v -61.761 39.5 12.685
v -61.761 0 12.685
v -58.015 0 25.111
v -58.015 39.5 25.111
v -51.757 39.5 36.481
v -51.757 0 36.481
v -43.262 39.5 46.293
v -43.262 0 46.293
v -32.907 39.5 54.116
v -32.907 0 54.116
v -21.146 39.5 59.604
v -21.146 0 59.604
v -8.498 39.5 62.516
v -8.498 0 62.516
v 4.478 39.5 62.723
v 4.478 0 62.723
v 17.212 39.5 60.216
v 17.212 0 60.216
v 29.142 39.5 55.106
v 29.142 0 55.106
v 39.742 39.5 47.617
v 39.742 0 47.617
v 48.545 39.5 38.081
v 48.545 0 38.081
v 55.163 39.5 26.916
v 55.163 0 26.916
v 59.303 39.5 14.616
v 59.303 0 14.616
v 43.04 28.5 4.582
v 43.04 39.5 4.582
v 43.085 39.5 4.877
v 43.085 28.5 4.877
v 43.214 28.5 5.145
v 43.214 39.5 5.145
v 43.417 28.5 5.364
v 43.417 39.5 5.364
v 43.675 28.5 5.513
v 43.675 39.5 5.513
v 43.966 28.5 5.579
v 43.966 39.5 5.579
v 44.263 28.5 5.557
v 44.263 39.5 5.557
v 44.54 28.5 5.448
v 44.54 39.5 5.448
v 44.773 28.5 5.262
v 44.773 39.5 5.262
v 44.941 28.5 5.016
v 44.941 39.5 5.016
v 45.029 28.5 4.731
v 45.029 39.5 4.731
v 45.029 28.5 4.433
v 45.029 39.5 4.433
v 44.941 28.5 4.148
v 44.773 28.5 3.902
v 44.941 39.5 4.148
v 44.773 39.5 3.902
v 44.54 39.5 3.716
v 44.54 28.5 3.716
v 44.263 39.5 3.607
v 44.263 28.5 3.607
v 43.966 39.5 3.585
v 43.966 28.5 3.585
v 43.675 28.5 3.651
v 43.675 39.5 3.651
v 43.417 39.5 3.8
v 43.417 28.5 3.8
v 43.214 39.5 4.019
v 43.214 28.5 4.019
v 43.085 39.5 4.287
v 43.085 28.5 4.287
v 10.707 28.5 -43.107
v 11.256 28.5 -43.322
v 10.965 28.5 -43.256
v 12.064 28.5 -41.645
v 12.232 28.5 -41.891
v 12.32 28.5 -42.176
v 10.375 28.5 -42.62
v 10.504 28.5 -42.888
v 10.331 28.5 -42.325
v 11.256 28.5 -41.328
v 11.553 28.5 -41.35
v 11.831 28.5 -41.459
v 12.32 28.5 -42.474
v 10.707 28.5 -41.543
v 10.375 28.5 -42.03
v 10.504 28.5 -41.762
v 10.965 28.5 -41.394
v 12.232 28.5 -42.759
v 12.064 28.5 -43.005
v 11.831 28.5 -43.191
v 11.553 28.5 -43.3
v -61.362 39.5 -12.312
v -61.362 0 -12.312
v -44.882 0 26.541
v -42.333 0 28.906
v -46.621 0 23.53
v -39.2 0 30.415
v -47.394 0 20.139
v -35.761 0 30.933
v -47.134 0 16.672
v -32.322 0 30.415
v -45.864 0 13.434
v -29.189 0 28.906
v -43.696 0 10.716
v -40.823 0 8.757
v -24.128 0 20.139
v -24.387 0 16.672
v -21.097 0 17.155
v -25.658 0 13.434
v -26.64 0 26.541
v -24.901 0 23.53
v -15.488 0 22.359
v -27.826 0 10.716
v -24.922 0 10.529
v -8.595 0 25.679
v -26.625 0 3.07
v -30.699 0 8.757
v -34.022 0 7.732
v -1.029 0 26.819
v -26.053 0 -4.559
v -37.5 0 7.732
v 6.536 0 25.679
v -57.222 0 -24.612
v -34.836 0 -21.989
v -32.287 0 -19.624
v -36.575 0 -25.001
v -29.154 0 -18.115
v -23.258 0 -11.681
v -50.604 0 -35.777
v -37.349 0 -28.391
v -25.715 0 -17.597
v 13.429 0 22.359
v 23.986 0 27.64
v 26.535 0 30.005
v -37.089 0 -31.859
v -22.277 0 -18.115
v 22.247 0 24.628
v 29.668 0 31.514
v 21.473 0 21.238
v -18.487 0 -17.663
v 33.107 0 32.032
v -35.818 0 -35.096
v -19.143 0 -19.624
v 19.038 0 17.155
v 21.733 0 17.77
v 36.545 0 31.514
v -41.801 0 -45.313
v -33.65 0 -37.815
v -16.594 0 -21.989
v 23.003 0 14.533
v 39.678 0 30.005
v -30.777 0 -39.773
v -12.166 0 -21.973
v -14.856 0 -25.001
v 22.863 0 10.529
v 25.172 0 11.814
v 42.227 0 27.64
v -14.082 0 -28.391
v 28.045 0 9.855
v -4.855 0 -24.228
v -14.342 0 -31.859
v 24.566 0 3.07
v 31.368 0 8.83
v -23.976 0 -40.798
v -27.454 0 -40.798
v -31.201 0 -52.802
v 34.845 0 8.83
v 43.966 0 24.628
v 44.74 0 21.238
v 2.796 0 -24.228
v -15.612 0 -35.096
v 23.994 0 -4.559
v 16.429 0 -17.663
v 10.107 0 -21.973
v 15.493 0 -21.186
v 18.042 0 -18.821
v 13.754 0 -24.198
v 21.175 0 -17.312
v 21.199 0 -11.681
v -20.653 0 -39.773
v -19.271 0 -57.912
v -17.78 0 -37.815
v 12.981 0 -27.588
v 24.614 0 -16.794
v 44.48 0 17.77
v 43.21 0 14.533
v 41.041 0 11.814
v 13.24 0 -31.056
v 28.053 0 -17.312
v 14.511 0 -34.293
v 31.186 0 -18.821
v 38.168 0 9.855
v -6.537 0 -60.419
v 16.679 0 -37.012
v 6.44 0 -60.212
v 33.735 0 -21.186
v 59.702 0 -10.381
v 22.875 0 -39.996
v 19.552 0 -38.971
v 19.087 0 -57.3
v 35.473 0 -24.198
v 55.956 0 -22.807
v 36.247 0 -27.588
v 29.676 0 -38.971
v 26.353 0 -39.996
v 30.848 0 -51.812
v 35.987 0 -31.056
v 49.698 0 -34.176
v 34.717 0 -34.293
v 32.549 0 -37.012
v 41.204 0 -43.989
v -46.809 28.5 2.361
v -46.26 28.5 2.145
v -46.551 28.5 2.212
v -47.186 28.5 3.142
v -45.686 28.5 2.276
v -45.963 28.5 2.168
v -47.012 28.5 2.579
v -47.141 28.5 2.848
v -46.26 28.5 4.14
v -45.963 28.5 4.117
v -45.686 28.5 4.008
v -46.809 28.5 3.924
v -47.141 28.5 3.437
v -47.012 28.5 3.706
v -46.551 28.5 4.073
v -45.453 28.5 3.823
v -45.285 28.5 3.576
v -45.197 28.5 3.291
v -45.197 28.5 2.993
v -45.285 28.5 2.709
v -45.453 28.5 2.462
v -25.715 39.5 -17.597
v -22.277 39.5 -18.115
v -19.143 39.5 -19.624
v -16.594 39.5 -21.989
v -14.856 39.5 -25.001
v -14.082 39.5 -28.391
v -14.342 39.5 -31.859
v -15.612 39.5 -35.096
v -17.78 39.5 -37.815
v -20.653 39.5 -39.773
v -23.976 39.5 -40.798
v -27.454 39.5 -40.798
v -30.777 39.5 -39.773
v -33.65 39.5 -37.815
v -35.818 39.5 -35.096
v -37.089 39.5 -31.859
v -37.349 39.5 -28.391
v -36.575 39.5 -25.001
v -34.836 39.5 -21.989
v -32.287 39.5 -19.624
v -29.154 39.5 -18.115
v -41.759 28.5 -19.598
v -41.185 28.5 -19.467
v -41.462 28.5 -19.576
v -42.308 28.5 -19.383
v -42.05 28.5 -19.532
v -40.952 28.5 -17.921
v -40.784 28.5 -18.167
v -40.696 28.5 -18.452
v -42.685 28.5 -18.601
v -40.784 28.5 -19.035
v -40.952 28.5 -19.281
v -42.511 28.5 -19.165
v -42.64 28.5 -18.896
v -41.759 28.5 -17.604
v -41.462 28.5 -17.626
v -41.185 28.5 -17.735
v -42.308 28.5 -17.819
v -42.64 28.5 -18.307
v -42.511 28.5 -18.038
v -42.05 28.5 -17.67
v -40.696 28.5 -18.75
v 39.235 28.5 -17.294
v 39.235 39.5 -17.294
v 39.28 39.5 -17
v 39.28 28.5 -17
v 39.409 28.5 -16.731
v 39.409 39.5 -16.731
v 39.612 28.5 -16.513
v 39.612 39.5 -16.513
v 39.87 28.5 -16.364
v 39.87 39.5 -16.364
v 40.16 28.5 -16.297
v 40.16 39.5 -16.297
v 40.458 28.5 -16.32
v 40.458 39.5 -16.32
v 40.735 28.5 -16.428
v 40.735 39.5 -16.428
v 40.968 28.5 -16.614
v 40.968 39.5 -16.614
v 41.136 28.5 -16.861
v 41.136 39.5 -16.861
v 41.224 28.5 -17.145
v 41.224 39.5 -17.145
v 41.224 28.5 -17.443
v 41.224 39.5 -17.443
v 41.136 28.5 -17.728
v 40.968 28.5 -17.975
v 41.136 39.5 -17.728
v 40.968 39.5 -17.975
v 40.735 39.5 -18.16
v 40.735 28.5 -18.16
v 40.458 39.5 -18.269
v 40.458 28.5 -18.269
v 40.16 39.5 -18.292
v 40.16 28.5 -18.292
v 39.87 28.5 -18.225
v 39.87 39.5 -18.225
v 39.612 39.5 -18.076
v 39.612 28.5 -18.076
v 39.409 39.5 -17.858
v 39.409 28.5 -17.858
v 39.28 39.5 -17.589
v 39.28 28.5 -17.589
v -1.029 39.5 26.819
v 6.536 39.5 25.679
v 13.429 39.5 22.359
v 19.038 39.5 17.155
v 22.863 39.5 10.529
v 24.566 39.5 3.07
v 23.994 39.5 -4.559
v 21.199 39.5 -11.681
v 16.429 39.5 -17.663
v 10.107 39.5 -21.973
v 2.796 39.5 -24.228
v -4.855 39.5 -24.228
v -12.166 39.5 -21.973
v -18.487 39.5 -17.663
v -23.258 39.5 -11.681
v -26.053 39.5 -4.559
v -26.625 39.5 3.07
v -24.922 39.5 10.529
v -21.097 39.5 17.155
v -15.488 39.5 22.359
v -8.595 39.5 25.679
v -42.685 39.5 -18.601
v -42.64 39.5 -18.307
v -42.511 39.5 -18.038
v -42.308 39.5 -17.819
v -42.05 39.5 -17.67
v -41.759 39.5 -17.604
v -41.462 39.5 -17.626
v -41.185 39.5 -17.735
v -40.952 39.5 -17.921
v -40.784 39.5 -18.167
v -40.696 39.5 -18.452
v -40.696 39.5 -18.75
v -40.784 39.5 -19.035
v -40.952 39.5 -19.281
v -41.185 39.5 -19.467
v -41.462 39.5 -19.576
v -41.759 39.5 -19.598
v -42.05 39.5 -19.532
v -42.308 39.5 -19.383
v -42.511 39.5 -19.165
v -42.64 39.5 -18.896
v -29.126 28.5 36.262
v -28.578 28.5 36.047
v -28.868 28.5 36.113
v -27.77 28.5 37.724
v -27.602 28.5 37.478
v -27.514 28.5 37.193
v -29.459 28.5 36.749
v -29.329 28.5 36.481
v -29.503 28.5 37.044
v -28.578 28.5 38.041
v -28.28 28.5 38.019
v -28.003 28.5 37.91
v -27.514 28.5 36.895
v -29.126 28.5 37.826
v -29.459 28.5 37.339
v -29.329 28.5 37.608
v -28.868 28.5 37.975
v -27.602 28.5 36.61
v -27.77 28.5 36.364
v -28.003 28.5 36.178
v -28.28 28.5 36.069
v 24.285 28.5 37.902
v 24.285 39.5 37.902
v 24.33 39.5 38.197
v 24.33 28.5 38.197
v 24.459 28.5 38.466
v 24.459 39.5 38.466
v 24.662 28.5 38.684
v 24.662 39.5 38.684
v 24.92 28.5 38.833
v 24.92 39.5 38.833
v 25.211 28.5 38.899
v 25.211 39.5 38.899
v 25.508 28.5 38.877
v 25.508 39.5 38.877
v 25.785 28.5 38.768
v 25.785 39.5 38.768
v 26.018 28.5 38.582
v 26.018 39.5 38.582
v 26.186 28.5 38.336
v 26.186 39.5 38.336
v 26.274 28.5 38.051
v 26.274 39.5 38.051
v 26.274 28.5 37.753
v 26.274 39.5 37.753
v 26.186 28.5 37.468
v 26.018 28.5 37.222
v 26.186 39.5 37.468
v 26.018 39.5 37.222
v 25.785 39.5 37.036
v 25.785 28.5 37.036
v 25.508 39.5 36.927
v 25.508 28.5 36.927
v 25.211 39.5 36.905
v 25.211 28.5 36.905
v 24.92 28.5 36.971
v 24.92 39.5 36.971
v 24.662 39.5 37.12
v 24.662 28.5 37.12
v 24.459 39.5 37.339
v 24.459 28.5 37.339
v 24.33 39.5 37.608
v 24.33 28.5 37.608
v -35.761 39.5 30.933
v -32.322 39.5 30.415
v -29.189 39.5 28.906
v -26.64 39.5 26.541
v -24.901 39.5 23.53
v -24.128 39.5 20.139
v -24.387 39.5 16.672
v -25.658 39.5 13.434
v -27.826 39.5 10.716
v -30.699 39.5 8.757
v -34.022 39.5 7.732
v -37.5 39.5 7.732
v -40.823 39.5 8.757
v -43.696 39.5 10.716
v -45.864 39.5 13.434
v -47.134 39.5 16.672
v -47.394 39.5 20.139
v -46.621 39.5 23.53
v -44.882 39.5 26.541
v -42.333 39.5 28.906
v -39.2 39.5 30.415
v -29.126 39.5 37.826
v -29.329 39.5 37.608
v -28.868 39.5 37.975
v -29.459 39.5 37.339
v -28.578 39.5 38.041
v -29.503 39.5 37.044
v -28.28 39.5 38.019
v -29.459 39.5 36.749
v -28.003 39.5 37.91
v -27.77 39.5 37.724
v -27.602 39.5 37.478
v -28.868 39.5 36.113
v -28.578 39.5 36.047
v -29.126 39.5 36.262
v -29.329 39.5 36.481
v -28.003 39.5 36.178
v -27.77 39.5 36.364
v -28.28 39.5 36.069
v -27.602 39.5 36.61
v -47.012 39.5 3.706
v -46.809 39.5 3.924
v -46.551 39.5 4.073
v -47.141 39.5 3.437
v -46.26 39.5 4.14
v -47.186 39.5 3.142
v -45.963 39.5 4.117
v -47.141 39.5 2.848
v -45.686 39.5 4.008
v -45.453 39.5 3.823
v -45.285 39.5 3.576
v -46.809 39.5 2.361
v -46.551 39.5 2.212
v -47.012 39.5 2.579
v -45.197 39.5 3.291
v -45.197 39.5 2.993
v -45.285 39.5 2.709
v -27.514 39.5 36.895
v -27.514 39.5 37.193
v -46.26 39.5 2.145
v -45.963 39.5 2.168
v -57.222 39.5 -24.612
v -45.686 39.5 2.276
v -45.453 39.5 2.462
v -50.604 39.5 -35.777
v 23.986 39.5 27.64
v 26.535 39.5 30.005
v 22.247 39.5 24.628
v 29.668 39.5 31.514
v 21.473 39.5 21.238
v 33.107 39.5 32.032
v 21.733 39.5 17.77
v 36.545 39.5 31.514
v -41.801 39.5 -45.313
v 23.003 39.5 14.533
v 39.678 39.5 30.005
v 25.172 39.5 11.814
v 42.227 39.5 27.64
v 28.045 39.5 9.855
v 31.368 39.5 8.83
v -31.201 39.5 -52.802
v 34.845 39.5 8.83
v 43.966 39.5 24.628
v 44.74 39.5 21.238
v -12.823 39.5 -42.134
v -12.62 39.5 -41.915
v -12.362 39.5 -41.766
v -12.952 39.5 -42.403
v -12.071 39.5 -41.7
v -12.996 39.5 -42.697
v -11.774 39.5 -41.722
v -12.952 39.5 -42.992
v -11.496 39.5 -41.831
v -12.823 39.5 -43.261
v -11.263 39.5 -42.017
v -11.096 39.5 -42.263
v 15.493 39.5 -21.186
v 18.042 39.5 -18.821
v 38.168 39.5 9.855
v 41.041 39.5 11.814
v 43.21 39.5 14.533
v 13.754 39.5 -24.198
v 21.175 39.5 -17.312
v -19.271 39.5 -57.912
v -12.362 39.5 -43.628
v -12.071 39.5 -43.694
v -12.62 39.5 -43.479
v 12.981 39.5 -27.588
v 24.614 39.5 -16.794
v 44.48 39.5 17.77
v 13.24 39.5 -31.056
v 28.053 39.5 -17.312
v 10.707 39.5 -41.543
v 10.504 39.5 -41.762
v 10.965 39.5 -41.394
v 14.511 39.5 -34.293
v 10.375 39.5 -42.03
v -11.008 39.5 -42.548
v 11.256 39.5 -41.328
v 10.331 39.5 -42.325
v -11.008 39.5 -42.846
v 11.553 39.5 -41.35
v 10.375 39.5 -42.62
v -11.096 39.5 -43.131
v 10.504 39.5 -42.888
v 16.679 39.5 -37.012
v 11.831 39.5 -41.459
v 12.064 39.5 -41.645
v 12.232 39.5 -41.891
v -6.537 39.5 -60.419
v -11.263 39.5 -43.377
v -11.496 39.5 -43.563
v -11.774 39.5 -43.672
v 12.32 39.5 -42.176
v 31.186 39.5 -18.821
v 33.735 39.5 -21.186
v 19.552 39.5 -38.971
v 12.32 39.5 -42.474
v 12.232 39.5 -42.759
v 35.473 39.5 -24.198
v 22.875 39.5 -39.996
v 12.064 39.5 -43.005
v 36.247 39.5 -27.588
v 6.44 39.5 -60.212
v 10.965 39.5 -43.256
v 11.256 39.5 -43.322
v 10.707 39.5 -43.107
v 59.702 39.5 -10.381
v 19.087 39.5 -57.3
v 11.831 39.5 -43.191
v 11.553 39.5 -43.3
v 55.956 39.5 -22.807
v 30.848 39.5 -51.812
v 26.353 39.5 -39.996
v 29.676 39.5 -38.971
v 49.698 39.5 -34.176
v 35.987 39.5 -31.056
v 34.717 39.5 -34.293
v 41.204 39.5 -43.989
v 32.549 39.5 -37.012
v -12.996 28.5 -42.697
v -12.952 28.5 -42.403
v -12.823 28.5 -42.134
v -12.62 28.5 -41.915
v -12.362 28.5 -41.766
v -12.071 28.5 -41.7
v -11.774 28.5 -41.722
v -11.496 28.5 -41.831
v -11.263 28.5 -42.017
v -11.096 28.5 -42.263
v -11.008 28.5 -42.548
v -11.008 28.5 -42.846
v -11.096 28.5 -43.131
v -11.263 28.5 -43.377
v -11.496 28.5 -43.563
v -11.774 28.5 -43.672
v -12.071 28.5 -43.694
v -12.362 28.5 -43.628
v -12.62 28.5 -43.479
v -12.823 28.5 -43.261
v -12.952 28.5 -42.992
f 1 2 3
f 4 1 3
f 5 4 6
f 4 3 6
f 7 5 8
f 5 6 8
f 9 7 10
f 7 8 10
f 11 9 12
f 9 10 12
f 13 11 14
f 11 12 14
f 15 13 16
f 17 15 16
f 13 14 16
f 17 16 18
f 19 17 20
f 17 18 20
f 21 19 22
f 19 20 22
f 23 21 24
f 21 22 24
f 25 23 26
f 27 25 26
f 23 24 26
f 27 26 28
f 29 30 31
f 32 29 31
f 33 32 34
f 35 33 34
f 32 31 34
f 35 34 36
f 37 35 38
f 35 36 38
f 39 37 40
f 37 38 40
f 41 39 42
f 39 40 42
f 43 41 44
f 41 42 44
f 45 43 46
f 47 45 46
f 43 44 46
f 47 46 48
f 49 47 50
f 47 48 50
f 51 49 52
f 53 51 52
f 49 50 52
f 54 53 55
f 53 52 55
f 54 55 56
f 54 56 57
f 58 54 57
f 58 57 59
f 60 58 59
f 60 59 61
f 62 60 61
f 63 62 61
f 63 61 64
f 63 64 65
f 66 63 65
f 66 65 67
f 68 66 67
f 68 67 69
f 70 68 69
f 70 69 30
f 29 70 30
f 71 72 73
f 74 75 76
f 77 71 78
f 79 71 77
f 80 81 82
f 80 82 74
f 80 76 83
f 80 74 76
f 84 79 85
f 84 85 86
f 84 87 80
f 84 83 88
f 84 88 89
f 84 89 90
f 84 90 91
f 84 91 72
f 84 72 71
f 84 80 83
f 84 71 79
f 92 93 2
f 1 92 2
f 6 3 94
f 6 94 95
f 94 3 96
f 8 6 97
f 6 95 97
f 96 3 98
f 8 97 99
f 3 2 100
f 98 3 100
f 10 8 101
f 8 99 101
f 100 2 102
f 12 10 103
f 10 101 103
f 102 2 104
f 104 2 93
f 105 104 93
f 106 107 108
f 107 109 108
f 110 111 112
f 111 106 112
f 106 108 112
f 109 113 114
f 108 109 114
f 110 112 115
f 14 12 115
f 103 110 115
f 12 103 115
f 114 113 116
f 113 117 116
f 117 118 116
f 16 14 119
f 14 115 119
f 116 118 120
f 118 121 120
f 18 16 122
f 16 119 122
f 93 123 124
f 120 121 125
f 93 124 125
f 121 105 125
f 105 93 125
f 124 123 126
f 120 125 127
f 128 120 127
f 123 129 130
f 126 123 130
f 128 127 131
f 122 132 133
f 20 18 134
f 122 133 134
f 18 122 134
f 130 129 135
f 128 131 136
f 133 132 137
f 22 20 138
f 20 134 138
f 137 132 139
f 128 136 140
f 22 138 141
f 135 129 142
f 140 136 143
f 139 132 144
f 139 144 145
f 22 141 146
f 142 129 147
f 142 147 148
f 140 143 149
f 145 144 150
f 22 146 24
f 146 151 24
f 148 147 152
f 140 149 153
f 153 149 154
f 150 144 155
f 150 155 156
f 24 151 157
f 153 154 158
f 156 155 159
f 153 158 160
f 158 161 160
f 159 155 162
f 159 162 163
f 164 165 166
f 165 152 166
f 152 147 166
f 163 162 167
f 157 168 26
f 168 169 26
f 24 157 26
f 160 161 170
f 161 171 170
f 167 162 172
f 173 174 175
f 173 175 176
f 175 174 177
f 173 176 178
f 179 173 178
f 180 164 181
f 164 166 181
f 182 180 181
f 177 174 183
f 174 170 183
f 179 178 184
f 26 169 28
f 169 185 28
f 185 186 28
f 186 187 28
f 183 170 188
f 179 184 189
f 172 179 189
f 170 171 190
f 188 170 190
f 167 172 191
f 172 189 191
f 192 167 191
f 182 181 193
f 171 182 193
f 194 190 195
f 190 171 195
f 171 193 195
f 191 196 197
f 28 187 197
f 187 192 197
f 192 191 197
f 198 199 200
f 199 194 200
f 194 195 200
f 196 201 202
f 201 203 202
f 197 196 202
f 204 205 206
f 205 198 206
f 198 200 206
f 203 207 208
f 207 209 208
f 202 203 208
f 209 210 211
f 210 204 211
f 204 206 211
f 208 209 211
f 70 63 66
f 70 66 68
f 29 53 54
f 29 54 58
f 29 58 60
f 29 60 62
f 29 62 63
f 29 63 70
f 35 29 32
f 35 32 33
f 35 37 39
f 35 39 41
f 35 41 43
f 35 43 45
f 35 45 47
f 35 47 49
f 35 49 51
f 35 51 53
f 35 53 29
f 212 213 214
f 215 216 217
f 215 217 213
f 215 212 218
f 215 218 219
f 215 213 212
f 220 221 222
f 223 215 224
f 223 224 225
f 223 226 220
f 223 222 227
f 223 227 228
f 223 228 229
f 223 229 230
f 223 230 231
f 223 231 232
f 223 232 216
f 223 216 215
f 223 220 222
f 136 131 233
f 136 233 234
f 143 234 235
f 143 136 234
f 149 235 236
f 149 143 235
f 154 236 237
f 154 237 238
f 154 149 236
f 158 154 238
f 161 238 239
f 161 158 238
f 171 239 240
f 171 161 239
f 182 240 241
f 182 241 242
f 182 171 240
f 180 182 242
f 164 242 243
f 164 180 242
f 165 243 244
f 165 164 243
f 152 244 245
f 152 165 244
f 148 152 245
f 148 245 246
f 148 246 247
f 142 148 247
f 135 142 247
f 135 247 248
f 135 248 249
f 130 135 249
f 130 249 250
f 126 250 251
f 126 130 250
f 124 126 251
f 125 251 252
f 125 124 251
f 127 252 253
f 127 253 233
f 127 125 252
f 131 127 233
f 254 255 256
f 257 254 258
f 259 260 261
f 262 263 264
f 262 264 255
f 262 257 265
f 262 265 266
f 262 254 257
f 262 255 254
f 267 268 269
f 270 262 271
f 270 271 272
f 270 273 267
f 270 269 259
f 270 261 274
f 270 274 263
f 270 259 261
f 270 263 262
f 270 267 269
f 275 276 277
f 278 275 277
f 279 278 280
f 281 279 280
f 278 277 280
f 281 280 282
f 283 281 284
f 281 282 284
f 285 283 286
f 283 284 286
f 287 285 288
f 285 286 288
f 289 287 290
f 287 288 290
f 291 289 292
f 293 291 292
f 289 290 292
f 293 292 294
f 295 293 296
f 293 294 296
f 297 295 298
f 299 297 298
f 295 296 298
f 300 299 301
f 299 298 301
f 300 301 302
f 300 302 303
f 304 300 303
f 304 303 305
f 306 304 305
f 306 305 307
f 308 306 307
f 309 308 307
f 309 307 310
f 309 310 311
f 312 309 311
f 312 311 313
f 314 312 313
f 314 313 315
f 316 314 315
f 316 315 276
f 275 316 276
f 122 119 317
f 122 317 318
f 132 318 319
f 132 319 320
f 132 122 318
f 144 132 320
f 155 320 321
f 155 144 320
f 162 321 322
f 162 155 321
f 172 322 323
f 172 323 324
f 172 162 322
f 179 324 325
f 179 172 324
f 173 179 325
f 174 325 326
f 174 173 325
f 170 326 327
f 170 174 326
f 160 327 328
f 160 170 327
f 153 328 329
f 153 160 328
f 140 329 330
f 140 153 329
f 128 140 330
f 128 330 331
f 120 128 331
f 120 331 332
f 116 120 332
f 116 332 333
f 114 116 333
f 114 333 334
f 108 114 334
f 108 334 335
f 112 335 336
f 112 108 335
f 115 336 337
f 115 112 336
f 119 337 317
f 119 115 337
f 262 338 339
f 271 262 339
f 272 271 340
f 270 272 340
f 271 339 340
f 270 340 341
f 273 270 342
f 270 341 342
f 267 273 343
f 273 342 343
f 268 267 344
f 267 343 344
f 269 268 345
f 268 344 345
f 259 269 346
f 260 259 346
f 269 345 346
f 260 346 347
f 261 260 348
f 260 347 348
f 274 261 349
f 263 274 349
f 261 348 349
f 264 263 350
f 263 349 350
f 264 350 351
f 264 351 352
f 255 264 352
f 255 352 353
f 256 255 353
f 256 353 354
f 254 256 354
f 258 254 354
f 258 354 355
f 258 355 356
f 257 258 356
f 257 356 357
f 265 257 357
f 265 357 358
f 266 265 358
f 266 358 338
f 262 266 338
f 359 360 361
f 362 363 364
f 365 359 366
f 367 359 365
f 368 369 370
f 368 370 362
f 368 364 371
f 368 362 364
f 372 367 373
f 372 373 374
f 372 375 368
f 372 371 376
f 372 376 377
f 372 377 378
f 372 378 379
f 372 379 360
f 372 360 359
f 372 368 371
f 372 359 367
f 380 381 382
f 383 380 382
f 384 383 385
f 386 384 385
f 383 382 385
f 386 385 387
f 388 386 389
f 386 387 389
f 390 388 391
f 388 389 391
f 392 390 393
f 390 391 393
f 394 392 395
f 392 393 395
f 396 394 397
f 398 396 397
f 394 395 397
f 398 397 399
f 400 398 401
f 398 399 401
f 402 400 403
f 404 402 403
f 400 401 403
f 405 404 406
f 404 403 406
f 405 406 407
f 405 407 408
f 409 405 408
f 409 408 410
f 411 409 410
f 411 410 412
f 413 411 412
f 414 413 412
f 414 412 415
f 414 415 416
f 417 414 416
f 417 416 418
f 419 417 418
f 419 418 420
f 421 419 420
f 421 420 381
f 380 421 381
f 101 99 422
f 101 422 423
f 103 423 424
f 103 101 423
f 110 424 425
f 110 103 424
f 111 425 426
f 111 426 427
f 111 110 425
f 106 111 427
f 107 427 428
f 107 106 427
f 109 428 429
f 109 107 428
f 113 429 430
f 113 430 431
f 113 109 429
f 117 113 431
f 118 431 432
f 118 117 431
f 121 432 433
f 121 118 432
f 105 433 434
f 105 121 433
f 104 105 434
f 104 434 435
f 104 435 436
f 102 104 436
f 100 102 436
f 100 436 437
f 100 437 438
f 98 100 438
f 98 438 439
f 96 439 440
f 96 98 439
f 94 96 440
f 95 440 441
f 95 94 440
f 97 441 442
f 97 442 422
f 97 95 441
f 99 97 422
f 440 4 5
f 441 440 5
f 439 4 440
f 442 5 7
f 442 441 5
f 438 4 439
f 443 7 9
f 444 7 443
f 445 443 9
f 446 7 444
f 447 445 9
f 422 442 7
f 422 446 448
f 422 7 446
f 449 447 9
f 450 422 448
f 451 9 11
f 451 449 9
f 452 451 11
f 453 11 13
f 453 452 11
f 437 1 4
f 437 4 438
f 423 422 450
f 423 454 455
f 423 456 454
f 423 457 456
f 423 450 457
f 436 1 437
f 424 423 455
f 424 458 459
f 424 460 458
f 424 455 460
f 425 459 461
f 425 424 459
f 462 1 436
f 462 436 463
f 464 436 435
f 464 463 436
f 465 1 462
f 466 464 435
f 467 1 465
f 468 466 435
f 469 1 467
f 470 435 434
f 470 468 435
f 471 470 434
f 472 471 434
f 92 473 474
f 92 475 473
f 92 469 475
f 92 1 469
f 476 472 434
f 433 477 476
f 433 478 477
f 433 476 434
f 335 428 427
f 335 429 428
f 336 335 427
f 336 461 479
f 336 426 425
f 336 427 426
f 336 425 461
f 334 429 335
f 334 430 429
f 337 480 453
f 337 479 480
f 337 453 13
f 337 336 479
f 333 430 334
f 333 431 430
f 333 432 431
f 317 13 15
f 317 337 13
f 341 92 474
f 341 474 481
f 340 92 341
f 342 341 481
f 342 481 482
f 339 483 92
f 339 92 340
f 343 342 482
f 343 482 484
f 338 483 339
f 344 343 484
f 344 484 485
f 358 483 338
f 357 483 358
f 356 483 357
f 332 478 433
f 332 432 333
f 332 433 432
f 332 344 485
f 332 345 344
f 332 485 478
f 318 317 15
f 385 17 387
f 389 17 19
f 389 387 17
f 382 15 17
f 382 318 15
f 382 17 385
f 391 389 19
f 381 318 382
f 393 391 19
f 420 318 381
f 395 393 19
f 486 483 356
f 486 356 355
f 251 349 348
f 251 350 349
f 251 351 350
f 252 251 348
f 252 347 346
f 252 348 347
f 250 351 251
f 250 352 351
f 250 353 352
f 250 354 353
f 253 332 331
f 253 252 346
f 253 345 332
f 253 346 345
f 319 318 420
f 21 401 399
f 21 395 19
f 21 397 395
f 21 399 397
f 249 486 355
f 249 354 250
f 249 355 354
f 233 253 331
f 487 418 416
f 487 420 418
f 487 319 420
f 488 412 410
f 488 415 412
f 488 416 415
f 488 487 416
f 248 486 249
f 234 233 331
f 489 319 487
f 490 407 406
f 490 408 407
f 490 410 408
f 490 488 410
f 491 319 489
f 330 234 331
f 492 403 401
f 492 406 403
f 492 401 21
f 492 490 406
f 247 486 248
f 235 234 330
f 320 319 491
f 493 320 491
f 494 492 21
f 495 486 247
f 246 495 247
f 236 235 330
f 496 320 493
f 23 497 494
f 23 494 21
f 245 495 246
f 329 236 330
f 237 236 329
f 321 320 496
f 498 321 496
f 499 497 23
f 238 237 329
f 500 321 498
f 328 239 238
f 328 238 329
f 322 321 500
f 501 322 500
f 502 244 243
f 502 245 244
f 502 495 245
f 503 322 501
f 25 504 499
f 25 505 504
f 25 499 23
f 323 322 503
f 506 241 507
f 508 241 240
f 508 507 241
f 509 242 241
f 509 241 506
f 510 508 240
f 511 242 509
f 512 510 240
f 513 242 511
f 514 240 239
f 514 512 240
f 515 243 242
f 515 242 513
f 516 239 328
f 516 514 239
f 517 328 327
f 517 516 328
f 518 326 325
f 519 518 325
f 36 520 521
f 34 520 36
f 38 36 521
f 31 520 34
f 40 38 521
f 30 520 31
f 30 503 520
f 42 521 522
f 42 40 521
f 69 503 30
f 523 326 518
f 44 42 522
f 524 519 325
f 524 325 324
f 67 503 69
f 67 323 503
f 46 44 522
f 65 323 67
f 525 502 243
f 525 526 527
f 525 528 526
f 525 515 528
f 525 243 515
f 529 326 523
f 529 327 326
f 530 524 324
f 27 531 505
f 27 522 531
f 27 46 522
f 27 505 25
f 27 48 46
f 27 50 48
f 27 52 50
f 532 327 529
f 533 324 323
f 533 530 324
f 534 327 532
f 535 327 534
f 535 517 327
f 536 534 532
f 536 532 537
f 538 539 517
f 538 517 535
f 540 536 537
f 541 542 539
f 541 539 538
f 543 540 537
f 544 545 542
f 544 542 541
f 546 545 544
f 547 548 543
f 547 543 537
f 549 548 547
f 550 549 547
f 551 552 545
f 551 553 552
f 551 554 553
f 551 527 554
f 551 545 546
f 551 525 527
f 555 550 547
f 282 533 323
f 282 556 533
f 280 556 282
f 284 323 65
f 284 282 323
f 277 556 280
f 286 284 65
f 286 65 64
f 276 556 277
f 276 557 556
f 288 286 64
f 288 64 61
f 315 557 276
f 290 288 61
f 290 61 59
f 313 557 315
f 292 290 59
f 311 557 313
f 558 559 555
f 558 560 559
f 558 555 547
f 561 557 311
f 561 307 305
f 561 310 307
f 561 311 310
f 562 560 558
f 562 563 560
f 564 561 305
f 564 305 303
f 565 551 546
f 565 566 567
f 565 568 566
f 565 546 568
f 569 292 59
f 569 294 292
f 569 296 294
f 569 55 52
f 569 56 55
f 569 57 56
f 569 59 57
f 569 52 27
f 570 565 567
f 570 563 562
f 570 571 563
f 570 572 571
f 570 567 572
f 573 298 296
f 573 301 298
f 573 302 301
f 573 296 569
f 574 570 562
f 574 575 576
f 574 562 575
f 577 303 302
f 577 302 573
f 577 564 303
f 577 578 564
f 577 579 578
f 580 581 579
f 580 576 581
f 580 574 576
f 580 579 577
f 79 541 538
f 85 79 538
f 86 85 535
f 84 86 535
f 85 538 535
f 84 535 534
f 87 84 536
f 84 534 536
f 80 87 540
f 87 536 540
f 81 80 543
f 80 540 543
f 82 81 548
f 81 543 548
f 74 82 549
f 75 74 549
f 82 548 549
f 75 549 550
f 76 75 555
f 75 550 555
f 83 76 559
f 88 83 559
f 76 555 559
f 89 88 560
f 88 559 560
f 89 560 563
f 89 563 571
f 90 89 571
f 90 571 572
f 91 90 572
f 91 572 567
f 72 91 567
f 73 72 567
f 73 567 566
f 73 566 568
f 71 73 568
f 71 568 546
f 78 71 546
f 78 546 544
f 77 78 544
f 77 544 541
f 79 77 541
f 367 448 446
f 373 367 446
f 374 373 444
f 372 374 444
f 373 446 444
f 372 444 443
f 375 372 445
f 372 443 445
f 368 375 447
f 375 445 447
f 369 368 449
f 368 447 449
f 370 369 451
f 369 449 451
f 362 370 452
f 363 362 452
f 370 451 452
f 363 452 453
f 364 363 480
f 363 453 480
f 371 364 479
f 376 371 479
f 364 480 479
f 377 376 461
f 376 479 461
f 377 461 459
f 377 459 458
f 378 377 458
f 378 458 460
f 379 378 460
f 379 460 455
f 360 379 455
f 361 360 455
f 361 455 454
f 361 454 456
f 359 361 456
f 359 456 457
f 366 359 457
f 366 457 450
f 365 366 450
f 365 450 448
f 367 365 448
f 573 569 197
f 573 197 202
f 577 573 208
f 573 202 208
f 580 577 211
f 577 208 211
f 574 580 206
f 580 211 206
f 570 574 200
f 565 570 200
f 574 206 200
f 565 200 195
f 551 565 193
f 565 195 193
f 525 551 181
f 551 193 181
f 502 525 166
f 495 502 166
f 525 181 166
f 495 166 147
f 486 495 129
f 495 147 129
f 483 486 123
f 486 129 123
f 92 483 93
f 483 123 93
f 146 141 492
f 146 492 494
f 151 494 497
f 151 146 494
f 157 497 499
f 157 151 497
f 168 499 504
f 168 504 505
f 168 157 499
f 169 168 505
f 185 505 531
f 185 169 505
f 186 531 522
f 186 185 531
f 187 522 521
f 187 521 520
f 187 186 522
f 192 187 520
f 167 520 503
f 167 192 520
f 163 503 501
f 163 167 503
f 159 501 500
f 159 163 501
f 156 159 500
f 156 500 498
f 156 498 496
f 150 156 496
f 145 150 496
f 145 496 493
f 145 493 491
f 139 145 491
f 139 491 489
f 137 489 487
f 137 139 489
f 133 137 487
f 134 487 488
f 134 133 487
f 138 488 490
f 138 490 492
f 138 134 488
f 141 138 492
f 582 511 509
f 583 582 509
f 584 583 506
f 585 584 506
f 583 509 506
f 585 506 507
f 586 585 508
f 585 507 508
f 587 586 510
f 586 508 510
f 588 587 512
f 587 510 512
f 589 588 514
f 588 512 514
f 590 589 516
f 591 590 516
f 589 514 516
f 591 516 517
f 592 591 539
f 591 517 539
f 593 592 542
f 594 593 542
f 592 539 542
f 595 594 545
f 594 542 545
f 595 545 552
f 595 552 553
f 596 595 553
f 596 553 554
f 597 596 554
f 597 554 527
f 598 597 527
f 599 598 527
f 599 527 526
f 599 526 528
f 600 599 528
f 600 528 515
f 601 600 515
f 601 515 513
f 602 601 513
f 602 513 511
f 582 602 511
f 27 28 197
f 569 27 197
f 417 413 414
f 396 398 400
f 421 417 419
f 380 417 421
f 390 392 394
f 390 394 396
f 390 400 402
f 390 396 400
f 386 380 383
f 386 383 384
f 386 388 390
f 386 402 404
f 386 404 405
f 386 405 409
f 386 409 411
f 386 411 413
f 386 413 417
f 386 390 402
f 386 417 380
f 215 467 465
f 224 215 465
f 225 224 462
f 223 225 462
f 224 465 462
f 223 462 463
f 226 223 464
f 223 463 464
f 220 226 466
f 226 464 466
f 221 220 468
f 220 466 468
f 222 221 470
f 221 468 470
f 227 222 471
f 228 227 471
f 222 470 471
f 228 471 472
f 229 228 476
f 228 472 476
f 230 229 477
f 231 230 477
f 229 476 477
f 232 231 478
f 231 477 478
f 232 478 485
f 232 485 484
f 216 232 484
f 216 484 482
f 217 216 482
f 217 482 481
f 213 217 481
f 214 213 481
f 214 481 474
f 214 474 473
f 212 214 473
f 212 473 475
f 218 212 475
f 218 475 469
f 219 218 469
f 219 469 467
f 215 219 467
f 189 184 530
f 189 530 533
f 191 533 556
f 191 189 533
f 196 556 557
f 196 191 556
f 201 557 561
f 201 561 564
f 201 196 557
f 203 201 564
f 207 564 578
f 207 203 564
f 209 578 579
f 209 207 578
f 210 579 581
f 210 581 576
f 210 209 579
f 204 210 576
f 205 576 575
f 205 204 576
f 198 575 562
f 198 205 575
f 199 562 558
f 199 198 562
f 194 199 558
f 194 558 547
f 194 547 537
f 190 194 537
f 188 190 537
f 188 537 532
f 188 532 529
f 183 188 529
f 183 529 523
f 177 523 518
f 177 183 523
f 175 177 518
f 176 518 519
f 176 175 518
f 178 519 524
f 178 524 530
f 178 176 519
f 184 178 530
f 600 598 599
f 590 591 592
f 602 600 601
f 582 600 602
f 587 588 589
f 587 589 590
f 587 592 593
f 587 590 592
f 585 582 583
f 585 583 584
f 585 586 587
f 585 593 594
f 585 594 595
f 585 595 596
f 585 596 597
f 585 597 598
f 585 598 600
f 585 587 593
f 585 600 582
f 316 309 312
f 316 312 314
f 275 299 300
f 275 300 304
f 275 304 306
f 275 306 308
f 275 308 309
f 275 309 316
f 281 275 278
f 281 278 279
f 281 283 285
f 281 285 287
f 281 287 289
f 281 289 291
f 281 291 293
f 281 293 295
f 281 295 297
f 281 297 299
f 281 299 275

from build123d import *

# Parameters (mm, degrees)
SKETCH1_R           = 25.667
SKETCH1_R_2         = 11.666
BOSS_EXTRUDE1_DEPTH = 39.5
SKETCH3_R           = 1
CUT_EXTRUDE2_DEPTH  = 12


with BuildPart() as part:
    # Sketch1 → Boss-Extrude1 (new body)
    with BuildSketch(Plane(origin=(0, 0, 0), x_dir=(0.9998860245595665, 0, -0.015097612078275651), z_dir=(0, 1, 0))):
        with BuildLine():
            Line((-61.169473244, 13.237048576), (-61.945593174, -11.750901277))
            ThreePointArc((-61.945593174, -11.750901277), (-2.965804858, -62.923588573), (59.076056366, -15.509805654))
            Line((59.076056366, -15.509805654), (59.852176295, 9.478144199))
            ThreePointArc((59.852176295, 9.478144199), (0.872387979, 60.650831495), (-61.169473244, 13.237048576))
        make_face()
        with Locations(Location((-1.046708439, -1.136378539, 0), (0, 0, 269.134937682))):
            Circle(SKETCH1_R, mode=Mode.SUBTRACT)
        with Locations(Location((-25.270455744, 29.647637614, 0), (0, 0, 269.134937682))):
            Circle(SKETCH1_R_2, mode=Mode.SUBTRACT)
        with Locations(Location((25.040791951, 28.084981925, 0), (0, 0, 269.134937682))):
            Circle(SKETCH1_R_2, mode=Mode.SUBTRACT)
        with Locations(Location((32.795299128, -20.863621322, 0), (0, 0, 269.134937682))):
            Circle(SKETCH1_R_2, mode=Mode.SUBTRACT)
        with Locations(Location((-36.047749659, -18.725372188, 0), (0, 0, 269.134937682))):
            Circle(SKETCH1_R_2, mode=Mode.SUBTRACT)
    extrude(amount=BOSS_EXTRUDE1_DEPTH)

    # Sketch3 → Cut-Extrude2 (cut)
    with BuildSketch(Plane(origin=(-5.108058327, 40.5, 5.9056653), x_dir=(0.9998727759206764, 0, 0.01595092388174038), z_dir=(0, 1, 0))):
        with Locations(Location((-7.662813984, 48.486882974, 0), (0, 0, 180.913959377))):
            Circle(SKETCH3_R)
        with Locations(Location((15.667378709, 48.486882974, 0), (0, 0, 180.913959377))):
            Circle(SKETCH3_R)
        with Locations(Location((44.967394337, 23.920411988, 0), (0, 0, 180.913959377))):
            Circle(SKETCH3_R)
        with Locations(Location((49.120943166, 2.107633512, 0), (0, 0, 180.913959377))):
            Circle(SKETCH3_R)
        with Locations(Location((30.899804125, -31.507727626, 0), (0, 0, 180.913959377))):
            Circle(SKETCH3_R)
        with Locations(Location((-22.895239399, -31.507727626, 0), (0, 0, 180.913959377))):
            Circle(SKETCH3_R)
        with Locations(Location((-41.116378441, 2.107633512, 0), (0, 0, 180.913959377))):
            Circle(SKETCH3_R)
        with Locations(Location((-36.962829611, 23.920411988, 0), (0, 0, 180.913959377))):
            Circle(SKETCH3_R)
    extrude(amount=-CUT_EXTRUDE2_DEPTH, mode=Mode.SUBTRACT)


solid = part.part
